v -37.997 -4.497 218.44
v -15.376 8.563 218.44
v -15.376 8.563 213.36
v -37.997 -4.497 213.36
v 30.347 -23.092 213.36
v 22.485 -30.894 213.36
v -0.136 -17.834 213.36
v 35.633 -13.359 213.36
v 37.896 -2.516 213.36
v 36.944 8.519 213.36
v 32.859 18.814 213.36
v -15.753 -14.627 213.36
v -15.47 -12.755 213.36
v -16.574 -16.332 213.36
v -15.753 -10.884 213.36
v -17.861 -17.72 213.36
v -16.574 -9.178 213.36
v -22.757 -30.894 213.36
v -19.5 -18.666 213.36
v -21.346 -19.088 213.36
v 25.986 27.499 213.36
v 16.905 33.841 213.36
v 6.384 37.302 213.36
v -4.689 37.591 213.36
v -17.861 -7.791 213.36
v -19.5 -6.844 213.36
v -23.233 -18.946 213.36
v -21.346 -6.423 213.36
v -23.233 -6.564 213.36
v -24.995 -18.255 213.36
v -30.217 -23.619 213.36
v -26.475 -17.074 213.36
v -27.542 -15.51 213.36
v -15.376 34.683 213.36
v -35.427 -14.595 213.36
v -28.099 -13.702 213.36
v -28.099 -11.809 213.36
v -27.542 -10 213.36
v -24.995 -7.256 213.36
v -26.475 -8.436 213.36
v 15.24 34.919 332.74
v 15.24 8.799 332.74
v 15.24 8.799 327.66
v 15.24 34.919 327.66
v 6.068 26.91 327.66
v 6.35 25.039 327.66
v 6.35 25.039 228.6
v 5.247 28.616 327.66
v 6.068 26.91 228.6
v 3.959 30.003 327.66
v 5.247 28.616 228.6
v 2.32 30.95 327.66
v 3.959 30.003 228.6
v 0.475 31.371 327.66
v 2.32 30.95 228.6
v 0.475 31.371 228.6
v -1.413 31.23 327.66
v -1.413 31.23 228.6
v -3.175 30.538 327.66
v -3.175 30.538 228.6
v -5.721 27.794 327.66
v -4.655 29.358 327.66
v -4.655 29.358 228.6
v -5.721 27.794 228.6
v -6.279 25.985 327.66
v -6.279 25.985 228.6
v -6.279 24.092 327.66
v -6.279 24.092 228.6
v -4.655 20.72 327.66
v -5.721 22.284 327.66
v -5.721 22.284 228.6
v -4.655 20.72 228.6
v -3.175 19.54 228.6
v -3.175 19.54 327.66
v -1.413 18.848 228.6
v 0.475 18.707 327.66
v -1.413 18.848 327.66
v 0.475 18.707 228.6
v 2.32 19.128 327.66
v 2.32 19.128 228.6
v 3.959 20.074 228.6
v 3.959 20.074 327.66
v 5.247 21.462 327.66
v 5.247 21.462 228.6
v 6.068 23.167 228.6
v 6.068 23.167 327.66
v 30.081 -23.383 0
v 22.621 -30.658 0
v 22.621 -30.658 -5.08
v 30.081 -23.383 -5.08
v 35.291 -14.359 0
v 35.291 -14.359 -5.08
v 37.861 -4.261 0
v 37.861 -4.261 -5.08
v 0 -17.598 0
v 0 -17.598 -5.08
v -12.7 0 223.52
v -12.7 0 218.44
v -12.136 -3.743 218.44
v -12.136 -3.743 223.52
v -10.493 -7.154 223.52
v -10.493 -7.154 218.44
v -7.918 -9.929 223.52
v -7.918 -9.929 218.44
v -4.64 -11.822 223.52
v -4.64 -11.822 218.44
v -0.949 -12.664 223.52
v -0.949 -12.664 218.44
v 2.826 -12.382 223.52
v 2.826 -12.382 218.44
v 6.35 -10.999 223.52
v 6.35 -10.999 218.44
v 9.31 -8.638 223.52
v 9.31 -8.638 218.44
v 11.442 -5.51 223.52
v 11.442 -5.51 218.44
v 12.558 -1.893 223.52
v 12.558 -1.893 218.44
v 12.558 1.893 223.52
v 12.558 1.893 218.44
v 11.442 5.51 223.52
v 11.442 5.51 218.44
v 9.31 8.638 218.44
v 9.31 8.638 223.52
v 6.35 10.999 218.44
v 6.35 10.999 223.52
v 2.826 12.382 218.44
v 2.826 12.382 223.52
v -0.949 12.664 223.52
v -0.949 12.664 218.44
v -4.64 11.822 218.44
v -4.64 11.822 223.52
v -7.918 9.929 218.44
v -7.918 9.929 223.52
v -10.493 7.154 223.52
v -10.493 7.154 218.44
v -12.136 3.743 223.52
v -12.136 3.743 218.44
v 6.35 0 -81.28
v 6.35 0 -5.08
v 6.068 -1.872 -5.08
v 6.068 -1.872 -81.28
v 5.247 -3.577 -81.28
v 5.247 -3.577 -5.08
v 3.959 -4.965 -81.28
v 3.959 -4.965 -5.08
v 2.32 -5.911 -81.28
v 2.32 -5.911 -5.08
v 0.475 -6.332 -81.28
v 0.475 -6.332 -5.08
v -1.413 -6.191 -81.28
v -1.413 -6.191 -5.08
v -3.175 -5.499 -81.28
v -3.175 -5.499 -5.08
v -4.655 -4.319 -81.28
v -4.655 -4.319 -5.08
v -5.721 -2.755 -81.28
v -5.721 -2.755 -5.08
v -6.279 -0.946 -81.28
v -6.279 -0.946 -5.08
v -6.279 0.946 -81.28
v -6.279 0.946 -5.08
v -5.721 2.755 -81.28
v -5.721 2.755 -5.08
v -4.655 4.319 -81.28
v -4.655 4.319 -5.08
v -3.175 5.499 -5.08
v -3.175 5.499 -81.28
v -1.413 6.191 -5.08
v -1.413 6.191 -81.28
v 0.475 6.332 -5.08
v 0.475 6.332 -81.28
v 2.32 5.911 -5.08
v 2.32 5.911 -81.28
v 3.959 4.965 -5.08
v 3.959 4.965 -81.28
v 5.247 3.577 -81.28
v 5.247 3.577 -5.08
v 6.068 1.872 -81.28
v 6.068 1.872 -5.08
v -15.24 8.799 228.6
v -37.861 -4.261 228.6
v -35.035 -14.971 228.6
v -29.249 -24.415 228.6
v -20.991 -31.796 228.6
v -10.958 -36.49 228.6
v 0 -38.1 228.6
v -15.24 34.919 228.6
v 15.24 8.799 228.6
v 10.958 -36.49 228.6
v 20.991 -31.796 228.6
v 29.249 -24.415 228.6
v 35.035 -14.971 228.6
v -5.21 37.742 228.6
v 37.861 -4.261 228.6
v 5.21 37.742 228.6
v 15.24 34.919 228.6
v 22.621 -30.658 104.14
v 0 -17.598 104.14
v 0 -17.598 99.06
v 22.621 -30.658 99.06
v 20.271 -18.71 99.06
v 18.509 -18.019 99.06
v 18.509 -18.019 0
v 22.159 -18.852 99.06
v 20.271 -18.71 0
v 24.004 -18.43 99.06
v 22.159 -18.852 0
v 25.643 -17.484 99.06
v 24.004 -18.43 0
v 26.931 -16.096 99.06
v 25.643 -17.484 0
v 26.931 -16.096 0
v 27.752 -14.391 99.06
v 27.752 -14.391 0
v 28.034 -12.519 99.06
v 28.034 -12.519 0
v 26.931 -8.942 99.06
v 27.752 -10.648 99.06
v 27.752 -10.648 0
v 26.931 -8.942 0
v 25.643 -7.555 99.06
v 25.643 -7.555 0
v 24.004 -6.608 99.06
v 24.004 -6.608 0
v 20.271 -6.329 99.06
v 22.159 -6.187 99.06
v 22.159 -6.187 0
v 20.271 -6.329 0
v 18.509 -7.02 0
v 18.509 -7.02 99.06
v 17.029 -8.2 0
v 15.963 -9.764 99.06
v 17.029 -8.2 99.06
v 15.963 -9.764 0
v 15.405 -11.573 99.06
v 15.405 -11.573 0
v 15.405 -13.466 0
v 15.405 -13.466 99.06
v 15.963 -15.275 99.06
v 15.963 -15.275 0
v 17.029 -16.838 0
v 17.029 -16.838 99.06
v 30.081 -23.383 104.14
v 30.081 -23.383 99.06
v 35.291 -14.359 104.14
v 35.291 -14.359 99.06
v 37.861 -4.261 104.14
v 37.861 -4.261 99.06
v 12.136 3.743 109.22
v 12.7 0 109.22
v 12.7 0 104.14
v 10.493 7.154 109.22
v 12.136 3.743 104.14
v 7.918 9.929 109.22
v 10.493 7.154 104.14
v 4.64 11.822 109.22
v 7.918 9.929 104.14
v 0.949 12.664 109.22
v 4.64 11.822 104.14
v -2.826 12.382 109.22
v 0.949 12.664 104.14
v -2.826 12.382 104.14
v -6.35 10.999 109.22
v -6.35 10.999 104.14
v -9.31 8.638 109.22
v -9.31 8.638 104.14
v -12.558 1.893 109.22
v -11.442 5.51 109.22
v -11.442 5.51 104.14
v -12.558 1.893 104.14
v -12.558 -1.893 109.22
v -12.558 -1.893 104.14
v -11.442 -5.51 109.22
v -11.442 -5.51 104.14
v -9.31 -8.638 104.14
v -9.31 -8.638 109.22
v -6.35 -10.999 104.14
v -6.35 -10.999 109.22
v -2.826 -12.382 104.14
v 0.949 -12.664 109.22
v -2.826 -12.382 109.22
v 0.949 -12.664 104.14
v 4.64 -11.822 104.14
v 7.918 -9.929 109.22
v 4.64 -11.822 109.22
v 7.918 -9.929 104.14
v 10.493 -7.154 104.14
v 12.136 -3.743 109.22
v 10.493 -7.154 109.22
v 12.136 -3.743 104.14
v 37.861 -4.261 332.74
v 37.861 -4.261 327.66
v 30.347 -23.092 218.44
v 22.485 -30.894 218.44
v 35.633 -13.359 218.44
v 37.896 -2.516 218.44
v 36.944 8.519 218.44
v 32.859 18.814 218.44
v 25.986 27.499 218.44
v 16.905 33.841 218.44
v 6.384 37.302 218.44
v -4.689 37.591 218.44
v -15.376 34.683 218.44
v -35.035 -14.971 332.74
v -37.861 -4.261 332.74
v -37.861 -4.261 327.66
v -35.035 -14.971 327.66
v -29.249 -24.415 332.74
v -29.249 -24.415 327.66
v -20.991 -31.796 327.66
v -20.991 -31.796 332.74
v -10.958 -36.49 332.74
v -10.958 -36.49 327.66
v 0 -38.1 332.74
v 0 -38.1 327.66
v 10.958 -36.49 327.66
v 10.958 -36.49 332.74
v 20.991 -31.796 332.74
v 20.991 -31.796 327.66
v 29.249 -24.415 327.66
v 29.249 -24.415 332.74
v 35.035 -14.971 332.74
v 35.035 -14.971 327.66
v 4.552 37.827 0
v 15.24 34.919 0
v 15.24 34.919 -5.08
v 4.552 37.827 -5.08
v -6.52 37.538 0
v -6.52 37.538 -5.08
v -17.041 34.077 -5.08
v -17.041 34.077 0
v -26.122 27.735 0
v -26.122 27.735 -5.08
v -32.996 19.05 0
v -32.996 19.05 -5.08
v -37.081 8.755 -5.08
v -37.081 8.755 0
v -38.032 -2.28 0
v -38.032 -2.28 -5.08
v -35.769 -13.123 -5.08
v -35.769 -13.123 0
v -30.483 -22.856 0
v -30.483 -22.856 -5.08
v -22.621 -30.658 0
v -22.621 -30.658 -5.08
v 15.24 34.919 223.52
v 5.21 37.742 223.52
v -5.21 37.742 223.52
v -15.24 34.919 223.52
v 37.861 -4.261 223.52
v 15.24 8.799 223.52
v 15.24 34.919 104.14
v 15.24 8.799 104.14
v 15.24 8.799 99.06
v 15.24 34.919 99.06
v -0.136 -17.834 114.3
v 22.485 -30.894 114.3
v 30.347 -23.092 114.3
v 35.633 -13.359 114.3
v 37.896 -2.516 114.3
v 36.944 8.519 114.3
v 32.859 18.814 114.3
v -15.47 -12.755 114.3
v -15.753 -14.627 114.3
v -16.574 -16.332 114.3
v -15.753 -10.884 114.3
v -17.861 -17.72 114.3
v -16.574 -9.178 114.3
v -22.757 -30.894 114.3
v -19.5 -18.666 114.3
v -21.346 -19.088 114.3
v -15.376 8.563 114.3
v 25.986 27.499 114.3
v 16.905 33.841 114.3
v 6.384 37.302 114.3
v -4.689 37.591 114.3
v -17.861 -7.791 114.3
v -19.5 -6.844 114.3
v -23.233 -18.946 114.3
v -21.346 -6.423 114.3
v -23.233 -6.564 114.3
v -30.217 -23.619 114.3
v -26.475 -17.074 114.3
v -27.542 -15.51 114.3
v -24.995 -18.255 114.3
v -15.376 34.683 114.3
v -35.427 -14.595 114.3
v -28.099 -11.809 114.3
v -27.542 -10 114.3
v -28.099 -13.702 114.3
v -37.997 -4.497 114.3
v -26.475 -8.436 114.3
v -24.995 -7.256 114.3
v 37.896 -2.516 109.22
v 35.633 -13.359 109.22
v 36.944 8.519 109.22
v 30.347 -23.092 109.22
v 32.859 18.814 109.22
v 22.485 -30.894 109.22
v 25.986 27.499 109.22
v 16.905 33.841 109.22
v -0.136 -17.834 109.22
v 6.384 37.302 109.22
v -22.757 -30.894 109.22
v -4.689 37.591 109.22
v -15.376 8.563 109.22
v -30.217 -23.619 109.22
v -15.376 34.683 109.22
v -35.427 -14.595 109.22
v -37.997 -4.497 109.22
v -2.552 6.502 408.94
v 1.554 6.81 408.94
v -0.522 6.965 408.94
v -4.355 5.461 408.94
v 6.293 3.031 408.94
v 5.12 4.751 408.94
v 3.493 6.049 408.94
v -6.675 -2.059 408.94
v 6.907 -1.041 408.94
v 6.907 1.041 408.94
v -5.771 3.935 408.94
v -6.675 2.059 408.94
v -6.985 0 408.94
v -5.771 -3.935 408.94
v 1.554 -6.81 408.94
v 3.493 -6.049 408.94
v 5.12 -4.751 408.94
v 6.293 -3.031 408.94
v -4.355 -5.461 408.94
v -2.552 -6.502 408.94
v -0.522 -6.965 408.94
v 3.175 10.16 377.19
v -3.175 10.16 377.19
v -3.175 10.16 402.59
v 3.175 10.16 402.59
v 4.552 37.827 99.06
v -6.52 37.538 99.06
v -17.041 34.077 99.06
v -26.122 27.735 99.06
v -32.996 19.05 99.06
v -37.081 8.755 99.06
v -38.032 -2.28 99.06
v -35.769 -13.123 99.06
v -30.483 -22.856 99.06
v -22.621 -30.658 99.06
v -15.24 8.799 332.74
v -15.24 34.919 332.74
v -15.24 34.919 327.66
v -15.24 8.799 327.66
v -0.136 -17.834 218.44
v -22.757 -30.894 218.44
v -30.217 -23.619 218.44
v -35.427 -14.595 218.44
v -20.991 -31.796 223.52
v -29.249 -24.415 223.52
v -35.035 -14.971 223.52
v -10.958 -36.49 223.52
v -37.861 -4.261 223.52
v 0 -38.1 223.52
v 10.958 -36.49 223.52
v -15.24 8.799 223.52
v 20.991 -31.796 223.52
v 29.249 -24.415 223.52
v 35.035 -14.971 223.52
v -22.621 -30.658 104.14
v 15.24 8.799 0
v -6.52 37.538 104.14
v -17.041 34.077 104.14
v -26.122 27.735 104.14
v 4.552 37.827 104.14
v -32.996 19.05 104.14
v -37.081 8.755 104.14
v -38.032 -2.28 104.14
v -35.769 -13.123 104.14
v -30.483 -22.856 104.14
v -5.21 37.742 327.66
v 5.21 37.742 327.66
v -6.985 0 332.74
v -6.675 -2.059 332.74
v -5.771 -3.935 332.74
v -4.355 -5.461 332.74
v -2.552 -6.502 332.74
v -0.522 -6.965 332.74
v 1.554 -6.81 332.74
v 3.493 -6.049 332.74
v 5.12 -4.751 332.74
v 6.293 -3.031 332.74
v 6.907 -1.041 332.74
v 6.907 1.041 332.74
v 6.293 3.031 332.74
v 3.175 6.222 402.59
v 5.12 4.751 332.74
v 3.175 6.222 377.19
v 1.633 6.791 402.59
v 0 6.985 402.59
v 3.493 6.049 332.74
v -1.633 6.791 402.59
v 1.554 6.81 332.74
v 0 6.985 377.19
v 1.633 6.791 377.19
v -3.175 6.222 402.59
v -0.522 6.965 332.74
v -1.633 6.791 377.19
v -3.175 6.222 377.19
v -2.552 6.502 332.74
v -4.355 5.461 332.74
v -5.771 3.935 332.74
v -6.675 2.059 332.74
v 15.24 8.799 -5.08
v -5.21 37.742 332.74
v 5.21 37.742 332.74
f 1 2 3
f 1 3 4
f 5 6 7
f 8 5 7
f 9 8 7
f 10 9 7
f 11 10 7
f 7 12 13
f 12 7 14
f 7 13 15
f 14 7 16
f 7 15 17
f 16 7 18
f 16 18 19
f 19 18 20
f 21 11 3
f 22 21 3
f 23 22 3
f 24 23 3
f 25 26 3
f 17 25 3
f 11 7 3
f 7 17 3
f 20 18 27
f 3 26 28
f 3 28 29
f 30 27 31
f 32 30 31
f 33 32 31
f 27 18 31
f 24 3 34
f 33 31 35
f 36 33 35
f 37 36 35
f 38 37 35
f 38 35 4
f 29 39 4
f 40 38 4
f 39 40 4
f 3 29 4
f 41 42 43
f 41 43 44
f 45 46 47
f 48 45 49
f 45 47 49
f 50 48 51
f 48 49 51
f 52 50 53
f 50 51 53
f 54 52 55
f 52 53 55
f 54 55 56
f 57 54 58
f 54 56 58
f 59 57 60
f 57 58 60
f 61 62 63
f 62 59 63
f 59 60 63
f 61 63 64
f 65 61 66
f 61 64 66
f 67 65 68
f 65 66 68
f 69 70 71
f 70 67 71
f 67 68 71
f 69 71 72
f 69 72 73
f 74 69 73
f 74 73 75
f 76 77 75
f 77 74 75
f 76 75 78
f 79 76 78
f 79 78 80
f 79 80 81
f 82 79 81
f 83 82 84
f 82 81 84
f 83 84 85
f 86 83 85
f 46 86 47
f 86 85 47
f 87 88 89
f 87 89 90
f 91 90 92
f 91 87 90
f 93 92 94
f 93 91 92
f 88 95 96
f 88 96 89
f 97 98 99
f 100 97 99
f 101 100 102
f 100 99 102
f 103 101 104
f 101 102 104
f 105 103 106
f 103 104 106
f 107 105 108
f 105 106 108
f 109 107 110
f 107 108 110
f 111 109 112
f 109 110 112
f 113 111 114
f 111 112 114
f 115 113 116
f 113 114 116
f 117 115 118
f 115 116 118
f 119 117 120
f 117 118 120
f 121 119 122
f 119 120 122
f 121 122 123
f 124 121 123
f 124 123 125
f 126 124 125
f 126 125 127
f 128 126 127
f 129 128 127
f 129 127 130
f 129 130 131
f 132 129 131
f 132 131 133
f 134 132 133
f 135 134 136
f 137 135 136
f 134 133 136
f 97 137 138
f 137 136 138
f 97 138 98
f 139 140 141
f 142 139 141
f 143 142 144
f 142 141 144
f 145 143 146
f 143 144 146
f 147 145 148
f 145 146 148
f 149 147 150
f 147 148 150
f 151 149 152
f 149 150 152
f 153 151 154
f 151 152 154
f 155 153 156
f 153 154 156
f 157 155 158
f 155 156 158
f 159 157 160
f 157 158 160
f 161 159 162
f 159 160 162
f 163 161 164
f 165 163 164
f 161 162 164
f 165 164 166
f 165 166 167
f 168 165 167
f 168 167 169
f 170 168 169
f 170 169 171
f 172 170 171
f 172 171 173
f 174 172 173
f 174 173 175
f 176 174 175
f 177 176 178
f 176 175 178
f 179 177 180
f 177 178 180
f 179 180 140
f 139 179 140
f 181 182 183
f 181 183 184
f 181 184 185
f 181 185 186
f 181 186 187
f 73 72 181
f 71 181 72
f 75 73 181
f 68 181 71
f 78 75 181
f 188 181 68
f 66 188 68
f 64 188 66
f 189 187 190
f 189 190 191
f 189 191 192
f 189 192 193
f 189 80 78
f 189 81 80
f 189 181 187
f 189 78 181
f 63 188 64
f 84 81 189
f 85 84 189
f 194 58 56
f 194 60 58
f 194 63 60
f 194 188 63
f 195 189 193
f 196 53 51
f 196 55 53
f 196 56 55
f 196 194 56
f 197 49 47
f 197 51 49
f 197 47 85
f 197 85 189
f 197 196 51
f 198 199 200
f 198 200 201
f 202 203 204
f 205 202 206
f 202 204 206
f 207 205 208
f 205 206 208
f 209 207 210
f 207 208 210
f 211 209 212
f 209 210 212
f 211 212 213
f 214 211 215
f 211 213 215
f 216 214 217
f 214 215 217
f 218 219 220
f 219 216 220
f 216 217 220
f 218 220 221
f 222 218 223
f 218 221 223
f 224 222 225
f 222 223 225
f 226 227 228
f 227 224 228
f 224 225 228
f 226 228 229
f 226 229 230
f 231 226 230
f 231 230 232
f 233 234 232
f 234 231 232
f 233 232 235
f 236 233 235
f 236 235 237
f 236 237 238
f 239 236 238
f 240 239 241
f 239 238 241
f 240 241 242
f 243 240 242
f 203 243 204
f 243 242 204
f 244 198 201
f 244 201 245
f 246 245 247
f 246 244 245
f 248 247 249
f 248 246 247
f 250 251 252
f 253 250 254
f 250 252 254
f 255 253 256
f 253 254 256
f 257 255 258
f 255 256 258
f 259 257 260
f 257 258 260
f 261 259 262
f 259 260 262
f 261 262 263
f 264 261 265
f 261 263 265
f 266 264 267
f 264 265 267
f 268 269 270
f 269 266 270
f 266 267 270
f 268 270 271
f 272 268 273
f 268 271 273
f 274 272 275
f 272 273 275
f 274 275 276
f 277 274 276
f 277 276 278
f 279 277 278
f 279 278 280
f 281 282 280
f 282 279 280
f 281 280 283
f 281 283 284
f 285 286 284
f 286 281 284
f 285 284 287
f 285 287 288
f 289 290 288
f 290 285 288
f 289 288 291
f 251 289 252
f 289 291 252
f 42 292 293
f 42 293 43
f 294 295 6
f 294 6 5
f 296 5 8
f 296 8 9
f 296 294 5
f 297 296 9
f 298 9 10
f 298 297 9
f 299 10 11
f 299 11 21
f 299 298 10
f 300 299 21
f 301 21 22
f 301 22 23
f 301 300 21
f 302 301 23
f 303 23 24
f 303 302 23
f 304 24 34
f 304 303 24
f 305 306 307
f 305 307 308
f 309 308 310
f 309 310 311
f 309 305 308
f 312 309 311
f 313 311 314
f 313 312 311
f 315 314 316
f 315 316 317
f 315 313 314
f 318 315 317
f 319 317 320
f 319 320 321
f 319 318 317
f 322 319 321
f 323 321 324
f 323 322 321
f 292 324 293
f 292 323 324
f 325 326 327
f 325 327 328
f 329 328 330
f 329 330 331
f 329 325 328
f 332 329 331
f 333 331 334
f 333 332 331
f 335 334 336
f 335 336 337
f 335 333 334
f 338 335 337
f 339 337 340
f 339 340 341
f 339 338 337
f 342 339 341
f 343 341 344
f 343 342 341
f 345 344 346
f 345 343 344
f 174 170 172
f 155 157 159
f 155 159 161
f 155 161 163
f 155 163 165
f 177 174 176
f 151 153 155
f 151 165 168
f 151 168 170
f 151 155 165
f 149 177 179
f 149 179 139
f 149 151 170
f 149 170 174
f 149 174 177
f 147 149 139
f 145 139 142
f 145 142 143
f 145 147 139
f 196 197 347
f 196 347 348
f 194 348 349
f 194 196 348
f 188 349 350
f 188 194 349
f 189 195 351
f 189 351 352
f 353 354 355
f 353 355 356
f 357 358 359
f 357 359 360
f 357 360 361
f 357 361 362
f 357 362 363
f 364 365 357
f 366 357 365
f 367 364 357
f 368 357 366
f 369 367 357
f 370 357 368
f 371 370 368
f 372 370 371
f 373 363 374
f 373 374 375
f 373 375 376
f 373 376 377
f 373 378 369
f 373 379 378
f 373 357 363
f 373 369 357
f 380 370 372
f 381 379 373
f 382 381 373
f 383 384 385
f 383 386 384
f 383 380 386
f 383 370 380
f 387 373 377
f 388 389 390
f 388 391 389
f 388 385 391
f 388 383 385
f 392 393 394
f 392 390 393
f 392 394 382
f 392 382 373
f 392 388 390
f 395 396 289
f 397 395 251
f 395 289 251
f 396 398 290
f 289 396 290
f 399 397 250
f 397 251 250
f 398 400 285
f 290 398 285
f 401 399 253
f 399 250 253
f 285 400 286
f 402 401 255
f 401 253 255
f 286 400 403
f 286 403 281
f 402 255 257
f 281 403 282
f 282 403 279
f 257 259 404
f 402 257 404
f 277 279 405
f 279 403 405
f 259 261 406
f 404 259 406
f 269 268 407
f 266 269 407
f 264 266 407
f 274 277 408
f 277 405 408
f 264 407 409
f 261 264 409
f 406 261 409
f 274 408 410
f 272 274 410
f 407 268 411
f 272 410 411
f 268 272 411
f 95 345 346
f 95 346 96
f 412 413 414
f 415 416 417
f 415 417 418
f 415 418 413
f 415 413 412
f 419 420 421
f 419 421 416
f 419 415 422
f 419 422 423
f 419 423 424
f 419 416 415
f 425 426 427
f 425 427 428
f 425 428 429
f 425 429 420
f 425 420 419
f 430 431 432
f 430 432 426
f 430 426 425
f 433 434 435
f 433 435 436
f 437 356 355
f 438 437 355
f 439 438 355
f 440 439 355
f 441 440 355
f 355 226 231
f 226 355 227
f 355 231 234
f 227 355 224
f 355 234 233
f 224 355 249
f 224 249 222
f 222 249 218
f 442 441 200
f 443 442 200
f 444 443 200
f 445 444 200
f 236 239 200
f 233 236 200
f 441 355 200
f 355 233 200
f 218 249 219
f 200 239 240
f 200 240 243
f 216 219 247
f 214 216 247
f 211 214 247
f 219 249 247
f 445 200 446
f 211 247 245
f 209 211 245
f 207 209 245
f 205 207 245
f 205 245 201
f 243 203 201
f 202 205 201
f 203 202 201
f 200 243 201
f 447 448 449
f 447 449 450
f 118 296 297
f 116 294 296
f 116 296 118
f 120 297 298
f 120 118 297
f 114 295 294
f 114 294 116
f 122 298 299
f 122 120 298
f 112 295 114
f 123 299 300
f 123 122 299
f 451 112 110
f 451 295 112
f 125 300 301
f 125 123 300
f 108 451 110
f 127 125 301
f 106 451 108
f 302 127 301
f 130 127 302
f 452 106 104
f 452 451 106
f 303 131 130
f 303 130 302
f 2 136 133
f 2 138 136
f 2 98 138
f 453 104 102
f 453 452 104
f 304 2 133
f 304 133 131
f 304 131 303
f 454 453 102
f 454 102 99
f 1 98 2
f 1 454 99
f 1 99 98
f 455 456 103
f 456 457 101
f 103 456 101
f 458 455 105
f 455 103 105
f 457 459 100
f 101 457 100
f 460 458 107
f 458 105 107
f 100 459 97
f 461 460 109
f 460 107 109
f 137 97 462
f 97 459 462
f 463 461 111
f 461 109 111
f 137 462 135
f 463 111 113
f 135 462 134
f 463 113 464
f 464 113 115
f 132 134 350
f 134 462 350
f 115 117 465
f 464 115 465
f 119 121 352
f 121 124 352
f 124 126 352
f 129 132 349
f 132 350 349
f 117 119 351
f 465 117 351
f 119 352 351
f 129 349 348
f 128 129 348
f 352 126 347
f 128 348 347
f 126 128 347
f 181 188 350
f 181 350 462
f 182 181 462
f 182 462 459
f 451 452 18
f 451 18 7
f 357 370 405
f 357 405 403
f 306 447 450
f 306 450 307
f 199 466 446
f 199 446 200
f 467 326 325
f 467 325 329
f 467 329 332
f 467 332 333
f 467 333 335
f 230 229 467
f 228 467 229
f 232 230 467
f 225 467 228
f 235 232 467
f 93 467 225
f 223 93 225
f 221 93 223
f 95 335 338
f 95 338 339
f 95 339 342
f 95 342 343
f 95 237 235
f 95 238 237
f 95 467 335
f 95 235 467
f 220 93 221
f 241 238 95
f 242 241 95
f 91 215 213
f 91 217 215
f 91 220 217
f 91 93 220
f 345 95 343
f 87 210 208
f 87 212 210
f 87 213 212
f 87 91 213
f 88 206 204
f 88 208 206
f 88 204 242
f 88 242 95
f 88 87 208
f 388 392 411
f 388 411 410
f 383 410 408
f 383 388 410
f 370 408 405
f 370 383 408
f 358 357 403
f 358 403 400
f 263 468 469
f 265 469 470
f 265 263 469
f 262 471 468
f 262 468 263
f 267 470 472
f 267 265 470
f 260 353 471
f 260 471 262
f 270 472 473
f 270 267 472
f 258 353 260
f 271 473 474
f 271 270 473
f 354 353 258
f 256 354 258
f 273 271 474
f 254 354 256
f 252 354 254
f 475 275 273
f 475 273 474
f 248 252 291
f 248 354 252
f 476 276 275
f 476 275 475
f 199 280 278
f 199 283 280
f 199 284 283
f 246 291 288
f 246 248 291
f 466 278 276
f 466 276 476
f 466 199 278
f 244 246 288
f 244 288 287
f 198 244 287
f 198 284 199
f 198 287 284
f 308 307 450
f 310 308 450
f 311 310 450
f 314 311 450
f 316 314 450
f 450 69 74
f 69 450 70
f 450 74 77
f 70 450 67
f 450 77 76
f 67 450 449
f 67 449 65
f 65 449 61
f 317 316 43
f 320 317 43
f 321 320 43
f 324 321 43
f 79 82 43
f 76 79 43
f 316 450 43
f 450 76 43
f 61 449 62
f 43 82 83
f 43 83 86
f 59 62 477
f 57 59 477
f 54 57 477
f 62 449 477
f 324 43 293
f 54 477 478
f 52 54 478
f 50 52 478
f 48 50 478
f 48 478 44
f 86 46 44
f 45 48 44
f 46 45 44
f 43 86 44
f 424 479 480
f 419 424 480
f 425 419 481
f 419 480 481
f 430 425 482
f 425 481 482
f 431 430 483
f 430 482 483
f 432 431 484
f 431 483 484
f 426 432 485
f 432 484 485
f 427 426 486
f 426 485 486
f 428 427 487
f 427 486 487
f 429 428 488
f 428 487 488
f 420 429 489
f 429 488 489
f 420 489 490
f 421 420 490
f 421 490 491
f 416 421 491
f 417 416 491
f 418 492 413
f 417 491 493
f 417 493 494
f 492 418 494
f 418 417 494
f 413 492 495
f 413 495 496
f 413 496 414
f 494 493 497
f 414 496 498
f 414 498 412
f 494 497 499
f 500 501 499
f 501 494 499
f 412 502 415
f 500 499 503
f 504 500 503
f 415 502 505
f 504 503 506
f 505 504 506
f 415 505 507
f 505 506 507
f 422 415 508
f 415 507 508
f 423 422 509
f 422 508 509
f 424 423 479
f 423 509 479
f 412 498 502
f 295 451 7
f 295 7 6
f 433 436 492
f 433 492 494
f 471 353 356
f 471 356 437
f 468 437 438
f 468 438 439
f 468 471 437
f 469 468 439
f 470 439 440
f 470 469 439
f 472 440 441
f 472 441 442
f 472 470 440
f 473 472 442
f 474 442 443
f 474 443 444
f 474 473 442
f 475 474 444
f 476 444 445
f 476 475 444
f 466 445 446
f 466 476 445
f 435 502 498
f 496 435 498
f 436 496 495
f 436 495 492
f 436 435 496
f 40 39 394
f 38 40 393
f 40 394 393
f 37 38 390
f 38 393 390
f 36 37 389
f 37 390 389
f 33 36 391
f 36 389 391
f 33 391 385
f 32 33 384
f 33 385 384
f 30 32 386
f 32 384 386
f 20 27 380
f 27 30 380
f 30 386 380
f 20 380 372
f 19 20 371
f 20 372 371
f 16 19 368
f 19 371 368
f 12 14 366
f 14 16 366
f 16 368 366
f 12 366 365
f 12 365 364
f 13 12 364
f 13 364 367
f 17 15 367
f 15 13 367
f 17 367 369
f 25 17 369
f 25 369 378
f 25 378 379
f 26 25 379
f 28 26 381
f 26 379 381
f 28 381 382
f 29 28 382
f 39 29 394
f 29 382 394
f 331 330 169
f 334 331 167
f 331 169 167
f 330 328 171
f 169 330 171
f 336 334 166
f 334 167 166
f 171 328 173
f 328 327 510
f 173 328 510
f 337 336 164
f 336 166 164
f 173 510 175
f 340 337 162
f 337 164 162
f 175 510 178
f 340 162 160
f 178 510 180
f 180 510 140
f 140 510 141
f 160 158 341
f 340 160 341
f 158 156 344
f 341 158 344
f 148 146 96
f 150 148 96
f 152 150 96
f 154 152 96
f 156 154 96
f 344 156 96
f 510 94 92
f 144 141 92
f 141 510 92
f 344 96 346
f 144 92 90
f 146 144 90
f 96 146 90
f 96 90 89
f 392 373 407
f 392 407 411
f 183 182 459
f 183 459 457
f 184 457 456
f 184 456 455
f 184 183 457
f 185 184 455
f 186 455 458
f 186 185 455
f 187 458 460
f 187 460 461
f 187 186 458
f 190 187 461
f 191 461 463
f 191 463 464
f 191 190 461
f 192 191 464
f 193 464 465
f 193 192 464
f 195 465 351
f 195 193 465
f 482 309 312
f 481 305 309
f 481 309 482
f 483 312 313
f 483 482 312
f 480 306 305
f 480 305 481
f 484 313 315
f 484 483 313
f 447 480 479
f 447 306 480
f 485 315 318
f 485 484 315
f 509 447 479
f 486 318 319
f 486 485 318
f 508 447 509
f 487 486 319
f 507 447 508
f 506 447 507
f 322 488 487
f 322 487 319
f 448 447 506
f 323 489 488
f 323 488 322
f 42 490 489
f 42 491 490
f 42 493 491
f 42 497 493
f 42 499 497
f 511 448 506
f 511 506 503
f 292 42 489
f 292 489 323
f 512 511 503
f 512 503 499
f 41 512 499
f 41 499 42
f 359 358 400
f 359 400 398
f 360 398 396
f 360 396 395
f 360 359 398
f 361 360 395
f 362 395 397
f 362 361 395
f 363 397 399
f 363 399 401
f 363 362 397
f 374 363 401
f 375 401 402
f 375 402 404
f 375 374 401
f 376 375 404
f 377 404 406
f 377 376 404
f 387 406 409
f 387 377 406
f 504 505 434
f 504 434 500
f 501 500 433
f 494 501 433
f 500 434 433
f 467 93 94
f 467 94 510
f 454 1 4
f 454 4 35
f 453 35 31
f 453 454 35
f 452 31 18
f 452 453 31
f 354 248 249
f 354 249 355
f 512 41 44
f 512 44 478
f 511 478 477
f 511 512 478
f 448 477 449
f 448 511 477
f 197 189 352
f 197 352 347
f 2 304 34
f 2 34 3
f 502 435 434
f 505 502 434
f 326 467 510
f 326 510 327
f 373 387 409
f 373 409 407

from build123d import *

# Parameters (mm, degrees)
BOSS_EXTRUDE1_DEPTH      = 5.08
LPATTERN1_COUNT          = 2
LPATTERN1_PITCH          = 104.14
BOSS_EXTRUDE2_REACH      = 119.176
SKETCH3_R                = 6.35
LPATTERN2_COUNT          = 3
LPATTERN2_PITCH          = 114.3
BODY_MOVE_COPY2_ANGLE    = 120
BODY_MOVE_COPY3_ANGLE    = 120
BOSS_EXTRUDE3_REACH      = 236.864
SKETCH5_R                = 12.7
BOSS_EXTRUDE4_START      = 114.3
SKETCH5_2_R              = 12.7
BOSS_EXTRUDE4_DEPTH      = 5.08
SKETCH6_R                = 6.985
BOSS_EXTRUDE5_DEPTH      = 76.2
SKETCH7_R                = 6.35
BOSS_EXTRUDE6_DEPTH      = 76.2
BOSS_EXTRUDE7_REACH      = 424.634
BOSS_EXTRUDE7_END_RADIUS = 6.985
BOSS_EXTRUDE7_START      = 10.16
SKETCH8_W                = 6.35
SKETCH8_H                = 25.4


with BuildPart() as part:
    # Sketch2 → Boss-Extrude1 (new body)
    with BuildSketch(Plane.XY):
        with BuildLine():
            Line((15.24, 8.798818102), (15.24, 34.919226796))
            ThreePointArc((15.24, 34.919226796), (0, 38.1), (-15.24, 34.919226796))
            Line((-15.24, 34.919226796), (-15.24, 8.798818102))
            Line((-15.24, 8.798818102), (-37.860937485, -4.261386244))
            ThreePointArc((-37.860937485, -4.261386244), (0, -38.1), (37.860937485, -4.261386244))
            Line((37.860937485, -4.261386244), (15.24, 8.798818102))
        make_face()
    extrude(amount=-BOSS_EXTRUDE1_DEPTH)


with BuildPart() as lpattern1_1:
    # LPattern1: pattern copy
    add(part.part.moved(Location(Vector(0, 0, 1) * (1 * LPATTERN1_PITCH))))

    # Sketch3 → Boss-Extrude2 (add, up to next)
    with BuildSketch(Plane.XY, mode=Mode.PRIVATE) as boss_extrude2_sk1:
        with Locations((0, 25.038762276)):
            Circle(SKETCH3_R)
    boss_extrude2_tool1 = extrude(boss_extrude2_sk1.sketch, amount=BOSS_EXTRUDE2_REACH, mode=Mode.PRIVATE) - lpattern1_1.part

    add(part.part)  # Boss-Extrude2 merges part
    add(boss_extrude2_tool1.solids().sort_by_distance((0, 25.038762, 0))[0])


with BuildPart() as lpattern2_1:
    # LPattern2: pattern copy
    add(lpattern1_1.part.moved(Location(Vector(0, 0, 1) * (1 * LPATTERN2_PITCH))))


with BuildPart() as lpattern2_2:
    # LPattern2: pattern copy
    add(lpattern1_1.part.moved(Location(Vector(0, 0, 1) * (2 * LPATTERN2_PITCH))))


with BuildPart() as lpattern2_1_1:
    # Body-Move/Copy2: moved
    add(lpattern2_1.part.rotate(Axis((0, -0.157266766, 0), (0, 0, 1)), BODY_MOVE_COPY2_ANGLE))

    # Sketch5 → Boss-Extrude3 (add, up to next)
    with BuildSketch(Plane.XY.offset(104.14), mode=Mode.PRIVATE) as boss_extrude3_sk1:
        Circle(SKETCH5_R)
    boss_extrude3_tool1 = extrude(boss_extrude3_sk1.sketch, amount=BOSS_EXTRUDE3_REACH, mode=Mode.PRIVATE) - lpattern2_1_1.part


with BuildPart() as lpattern1_1_1:
    # Body-Move/Copy3: moved
    add(lpattern1_1.part.rotate(Axis((0, 0, 0), (0, 0, -1)), BODY_MOVE_COPY3_ANGLE))


with BuildPart() as lpattern2_1_2:
    add(lpattern2_1_1.part)

    add(lpattern1_1_1.part)  # Boss-Extrude3 merges LPattern1_1
    add(boss_extrude3_tool1.solids().sort_by_distance((0, 0, 104.14))[0])


    add(lpattern2_2.part)  # Boss-Extrude4 merges LPattern2_2
    # Sketch5<2> → Boss-Extrude4 (add)
    with BuildSketch(Plane.XY.offset(104.14).offset(BOSS_EXTRUDE4_START)):
        with Locations(Location((0, 0, 0), (0, 0, 180))):
            Circle(SKETCH5_2_R)
    extrude(amount=BOSS_EXTRUDE4_DEPTH)

    # Sketch6 → Boss-Extrude5 (add)
    with BuildSketch(Plane.XY.offset(332.74)):
        with Locations(Location((0, 0, 0), (0, 0, 180))):
            Circle(SKETCH6_R)
    extrude(amount=BOSS_EXTRUDE5_DEPTH)

    # Sketch7 → Boss-Extrude6 (add)
    with BuildSketch(Plane(origin=(0, 0, -5.08), x_dir=(-1, 0, 0), z_dir=(0, 0, -1))):
        with Locations(Location((0, 0, 0), (0, 0, 180))):
            Circle(SKETCH7_R)
    extrude(amount=BOSS_EXTRUDE6_DEPTH)

    # Boss-Extrude7: up to this cylinder (the profile starts outside it)
    boss_extrude7_end = Plane(origin=(0, 0, 389.89), z_dir=(0, 0, -1)) * Cylinder(BOSS_EXTRUDE7_END_RADIUS, 864.238, mode=Mode.PRIVATE)
    # Sketch8 → Boss-Extrude7 (add, up to the surface)
    with BuildSketch(Plane(origin=(0, 0, 0), x_dir=(1, 0, 0), z_dir=(0, 1, 0)).offset(BOSS_EXTRUDE7_START), mode=Mode.PRIVATE) as boss_extrude7_sk1:
        with Locations((0, -389.89)):
            Rectangle(SKETCH8_W, SKETCH8_H)
    boss_extrude7_tool1 = extrude(boss_extrude7_sk1.sketch, amount=-BOSS_EXTRUDE7_REACH, mode=Mode.PRIVATE) - boss_extrude7_end
    add(boss_extrude7_tool1.solids().sort_by_distance((0, 10.16, 389.89))[0])


solid = lpattern2_1_2.part
